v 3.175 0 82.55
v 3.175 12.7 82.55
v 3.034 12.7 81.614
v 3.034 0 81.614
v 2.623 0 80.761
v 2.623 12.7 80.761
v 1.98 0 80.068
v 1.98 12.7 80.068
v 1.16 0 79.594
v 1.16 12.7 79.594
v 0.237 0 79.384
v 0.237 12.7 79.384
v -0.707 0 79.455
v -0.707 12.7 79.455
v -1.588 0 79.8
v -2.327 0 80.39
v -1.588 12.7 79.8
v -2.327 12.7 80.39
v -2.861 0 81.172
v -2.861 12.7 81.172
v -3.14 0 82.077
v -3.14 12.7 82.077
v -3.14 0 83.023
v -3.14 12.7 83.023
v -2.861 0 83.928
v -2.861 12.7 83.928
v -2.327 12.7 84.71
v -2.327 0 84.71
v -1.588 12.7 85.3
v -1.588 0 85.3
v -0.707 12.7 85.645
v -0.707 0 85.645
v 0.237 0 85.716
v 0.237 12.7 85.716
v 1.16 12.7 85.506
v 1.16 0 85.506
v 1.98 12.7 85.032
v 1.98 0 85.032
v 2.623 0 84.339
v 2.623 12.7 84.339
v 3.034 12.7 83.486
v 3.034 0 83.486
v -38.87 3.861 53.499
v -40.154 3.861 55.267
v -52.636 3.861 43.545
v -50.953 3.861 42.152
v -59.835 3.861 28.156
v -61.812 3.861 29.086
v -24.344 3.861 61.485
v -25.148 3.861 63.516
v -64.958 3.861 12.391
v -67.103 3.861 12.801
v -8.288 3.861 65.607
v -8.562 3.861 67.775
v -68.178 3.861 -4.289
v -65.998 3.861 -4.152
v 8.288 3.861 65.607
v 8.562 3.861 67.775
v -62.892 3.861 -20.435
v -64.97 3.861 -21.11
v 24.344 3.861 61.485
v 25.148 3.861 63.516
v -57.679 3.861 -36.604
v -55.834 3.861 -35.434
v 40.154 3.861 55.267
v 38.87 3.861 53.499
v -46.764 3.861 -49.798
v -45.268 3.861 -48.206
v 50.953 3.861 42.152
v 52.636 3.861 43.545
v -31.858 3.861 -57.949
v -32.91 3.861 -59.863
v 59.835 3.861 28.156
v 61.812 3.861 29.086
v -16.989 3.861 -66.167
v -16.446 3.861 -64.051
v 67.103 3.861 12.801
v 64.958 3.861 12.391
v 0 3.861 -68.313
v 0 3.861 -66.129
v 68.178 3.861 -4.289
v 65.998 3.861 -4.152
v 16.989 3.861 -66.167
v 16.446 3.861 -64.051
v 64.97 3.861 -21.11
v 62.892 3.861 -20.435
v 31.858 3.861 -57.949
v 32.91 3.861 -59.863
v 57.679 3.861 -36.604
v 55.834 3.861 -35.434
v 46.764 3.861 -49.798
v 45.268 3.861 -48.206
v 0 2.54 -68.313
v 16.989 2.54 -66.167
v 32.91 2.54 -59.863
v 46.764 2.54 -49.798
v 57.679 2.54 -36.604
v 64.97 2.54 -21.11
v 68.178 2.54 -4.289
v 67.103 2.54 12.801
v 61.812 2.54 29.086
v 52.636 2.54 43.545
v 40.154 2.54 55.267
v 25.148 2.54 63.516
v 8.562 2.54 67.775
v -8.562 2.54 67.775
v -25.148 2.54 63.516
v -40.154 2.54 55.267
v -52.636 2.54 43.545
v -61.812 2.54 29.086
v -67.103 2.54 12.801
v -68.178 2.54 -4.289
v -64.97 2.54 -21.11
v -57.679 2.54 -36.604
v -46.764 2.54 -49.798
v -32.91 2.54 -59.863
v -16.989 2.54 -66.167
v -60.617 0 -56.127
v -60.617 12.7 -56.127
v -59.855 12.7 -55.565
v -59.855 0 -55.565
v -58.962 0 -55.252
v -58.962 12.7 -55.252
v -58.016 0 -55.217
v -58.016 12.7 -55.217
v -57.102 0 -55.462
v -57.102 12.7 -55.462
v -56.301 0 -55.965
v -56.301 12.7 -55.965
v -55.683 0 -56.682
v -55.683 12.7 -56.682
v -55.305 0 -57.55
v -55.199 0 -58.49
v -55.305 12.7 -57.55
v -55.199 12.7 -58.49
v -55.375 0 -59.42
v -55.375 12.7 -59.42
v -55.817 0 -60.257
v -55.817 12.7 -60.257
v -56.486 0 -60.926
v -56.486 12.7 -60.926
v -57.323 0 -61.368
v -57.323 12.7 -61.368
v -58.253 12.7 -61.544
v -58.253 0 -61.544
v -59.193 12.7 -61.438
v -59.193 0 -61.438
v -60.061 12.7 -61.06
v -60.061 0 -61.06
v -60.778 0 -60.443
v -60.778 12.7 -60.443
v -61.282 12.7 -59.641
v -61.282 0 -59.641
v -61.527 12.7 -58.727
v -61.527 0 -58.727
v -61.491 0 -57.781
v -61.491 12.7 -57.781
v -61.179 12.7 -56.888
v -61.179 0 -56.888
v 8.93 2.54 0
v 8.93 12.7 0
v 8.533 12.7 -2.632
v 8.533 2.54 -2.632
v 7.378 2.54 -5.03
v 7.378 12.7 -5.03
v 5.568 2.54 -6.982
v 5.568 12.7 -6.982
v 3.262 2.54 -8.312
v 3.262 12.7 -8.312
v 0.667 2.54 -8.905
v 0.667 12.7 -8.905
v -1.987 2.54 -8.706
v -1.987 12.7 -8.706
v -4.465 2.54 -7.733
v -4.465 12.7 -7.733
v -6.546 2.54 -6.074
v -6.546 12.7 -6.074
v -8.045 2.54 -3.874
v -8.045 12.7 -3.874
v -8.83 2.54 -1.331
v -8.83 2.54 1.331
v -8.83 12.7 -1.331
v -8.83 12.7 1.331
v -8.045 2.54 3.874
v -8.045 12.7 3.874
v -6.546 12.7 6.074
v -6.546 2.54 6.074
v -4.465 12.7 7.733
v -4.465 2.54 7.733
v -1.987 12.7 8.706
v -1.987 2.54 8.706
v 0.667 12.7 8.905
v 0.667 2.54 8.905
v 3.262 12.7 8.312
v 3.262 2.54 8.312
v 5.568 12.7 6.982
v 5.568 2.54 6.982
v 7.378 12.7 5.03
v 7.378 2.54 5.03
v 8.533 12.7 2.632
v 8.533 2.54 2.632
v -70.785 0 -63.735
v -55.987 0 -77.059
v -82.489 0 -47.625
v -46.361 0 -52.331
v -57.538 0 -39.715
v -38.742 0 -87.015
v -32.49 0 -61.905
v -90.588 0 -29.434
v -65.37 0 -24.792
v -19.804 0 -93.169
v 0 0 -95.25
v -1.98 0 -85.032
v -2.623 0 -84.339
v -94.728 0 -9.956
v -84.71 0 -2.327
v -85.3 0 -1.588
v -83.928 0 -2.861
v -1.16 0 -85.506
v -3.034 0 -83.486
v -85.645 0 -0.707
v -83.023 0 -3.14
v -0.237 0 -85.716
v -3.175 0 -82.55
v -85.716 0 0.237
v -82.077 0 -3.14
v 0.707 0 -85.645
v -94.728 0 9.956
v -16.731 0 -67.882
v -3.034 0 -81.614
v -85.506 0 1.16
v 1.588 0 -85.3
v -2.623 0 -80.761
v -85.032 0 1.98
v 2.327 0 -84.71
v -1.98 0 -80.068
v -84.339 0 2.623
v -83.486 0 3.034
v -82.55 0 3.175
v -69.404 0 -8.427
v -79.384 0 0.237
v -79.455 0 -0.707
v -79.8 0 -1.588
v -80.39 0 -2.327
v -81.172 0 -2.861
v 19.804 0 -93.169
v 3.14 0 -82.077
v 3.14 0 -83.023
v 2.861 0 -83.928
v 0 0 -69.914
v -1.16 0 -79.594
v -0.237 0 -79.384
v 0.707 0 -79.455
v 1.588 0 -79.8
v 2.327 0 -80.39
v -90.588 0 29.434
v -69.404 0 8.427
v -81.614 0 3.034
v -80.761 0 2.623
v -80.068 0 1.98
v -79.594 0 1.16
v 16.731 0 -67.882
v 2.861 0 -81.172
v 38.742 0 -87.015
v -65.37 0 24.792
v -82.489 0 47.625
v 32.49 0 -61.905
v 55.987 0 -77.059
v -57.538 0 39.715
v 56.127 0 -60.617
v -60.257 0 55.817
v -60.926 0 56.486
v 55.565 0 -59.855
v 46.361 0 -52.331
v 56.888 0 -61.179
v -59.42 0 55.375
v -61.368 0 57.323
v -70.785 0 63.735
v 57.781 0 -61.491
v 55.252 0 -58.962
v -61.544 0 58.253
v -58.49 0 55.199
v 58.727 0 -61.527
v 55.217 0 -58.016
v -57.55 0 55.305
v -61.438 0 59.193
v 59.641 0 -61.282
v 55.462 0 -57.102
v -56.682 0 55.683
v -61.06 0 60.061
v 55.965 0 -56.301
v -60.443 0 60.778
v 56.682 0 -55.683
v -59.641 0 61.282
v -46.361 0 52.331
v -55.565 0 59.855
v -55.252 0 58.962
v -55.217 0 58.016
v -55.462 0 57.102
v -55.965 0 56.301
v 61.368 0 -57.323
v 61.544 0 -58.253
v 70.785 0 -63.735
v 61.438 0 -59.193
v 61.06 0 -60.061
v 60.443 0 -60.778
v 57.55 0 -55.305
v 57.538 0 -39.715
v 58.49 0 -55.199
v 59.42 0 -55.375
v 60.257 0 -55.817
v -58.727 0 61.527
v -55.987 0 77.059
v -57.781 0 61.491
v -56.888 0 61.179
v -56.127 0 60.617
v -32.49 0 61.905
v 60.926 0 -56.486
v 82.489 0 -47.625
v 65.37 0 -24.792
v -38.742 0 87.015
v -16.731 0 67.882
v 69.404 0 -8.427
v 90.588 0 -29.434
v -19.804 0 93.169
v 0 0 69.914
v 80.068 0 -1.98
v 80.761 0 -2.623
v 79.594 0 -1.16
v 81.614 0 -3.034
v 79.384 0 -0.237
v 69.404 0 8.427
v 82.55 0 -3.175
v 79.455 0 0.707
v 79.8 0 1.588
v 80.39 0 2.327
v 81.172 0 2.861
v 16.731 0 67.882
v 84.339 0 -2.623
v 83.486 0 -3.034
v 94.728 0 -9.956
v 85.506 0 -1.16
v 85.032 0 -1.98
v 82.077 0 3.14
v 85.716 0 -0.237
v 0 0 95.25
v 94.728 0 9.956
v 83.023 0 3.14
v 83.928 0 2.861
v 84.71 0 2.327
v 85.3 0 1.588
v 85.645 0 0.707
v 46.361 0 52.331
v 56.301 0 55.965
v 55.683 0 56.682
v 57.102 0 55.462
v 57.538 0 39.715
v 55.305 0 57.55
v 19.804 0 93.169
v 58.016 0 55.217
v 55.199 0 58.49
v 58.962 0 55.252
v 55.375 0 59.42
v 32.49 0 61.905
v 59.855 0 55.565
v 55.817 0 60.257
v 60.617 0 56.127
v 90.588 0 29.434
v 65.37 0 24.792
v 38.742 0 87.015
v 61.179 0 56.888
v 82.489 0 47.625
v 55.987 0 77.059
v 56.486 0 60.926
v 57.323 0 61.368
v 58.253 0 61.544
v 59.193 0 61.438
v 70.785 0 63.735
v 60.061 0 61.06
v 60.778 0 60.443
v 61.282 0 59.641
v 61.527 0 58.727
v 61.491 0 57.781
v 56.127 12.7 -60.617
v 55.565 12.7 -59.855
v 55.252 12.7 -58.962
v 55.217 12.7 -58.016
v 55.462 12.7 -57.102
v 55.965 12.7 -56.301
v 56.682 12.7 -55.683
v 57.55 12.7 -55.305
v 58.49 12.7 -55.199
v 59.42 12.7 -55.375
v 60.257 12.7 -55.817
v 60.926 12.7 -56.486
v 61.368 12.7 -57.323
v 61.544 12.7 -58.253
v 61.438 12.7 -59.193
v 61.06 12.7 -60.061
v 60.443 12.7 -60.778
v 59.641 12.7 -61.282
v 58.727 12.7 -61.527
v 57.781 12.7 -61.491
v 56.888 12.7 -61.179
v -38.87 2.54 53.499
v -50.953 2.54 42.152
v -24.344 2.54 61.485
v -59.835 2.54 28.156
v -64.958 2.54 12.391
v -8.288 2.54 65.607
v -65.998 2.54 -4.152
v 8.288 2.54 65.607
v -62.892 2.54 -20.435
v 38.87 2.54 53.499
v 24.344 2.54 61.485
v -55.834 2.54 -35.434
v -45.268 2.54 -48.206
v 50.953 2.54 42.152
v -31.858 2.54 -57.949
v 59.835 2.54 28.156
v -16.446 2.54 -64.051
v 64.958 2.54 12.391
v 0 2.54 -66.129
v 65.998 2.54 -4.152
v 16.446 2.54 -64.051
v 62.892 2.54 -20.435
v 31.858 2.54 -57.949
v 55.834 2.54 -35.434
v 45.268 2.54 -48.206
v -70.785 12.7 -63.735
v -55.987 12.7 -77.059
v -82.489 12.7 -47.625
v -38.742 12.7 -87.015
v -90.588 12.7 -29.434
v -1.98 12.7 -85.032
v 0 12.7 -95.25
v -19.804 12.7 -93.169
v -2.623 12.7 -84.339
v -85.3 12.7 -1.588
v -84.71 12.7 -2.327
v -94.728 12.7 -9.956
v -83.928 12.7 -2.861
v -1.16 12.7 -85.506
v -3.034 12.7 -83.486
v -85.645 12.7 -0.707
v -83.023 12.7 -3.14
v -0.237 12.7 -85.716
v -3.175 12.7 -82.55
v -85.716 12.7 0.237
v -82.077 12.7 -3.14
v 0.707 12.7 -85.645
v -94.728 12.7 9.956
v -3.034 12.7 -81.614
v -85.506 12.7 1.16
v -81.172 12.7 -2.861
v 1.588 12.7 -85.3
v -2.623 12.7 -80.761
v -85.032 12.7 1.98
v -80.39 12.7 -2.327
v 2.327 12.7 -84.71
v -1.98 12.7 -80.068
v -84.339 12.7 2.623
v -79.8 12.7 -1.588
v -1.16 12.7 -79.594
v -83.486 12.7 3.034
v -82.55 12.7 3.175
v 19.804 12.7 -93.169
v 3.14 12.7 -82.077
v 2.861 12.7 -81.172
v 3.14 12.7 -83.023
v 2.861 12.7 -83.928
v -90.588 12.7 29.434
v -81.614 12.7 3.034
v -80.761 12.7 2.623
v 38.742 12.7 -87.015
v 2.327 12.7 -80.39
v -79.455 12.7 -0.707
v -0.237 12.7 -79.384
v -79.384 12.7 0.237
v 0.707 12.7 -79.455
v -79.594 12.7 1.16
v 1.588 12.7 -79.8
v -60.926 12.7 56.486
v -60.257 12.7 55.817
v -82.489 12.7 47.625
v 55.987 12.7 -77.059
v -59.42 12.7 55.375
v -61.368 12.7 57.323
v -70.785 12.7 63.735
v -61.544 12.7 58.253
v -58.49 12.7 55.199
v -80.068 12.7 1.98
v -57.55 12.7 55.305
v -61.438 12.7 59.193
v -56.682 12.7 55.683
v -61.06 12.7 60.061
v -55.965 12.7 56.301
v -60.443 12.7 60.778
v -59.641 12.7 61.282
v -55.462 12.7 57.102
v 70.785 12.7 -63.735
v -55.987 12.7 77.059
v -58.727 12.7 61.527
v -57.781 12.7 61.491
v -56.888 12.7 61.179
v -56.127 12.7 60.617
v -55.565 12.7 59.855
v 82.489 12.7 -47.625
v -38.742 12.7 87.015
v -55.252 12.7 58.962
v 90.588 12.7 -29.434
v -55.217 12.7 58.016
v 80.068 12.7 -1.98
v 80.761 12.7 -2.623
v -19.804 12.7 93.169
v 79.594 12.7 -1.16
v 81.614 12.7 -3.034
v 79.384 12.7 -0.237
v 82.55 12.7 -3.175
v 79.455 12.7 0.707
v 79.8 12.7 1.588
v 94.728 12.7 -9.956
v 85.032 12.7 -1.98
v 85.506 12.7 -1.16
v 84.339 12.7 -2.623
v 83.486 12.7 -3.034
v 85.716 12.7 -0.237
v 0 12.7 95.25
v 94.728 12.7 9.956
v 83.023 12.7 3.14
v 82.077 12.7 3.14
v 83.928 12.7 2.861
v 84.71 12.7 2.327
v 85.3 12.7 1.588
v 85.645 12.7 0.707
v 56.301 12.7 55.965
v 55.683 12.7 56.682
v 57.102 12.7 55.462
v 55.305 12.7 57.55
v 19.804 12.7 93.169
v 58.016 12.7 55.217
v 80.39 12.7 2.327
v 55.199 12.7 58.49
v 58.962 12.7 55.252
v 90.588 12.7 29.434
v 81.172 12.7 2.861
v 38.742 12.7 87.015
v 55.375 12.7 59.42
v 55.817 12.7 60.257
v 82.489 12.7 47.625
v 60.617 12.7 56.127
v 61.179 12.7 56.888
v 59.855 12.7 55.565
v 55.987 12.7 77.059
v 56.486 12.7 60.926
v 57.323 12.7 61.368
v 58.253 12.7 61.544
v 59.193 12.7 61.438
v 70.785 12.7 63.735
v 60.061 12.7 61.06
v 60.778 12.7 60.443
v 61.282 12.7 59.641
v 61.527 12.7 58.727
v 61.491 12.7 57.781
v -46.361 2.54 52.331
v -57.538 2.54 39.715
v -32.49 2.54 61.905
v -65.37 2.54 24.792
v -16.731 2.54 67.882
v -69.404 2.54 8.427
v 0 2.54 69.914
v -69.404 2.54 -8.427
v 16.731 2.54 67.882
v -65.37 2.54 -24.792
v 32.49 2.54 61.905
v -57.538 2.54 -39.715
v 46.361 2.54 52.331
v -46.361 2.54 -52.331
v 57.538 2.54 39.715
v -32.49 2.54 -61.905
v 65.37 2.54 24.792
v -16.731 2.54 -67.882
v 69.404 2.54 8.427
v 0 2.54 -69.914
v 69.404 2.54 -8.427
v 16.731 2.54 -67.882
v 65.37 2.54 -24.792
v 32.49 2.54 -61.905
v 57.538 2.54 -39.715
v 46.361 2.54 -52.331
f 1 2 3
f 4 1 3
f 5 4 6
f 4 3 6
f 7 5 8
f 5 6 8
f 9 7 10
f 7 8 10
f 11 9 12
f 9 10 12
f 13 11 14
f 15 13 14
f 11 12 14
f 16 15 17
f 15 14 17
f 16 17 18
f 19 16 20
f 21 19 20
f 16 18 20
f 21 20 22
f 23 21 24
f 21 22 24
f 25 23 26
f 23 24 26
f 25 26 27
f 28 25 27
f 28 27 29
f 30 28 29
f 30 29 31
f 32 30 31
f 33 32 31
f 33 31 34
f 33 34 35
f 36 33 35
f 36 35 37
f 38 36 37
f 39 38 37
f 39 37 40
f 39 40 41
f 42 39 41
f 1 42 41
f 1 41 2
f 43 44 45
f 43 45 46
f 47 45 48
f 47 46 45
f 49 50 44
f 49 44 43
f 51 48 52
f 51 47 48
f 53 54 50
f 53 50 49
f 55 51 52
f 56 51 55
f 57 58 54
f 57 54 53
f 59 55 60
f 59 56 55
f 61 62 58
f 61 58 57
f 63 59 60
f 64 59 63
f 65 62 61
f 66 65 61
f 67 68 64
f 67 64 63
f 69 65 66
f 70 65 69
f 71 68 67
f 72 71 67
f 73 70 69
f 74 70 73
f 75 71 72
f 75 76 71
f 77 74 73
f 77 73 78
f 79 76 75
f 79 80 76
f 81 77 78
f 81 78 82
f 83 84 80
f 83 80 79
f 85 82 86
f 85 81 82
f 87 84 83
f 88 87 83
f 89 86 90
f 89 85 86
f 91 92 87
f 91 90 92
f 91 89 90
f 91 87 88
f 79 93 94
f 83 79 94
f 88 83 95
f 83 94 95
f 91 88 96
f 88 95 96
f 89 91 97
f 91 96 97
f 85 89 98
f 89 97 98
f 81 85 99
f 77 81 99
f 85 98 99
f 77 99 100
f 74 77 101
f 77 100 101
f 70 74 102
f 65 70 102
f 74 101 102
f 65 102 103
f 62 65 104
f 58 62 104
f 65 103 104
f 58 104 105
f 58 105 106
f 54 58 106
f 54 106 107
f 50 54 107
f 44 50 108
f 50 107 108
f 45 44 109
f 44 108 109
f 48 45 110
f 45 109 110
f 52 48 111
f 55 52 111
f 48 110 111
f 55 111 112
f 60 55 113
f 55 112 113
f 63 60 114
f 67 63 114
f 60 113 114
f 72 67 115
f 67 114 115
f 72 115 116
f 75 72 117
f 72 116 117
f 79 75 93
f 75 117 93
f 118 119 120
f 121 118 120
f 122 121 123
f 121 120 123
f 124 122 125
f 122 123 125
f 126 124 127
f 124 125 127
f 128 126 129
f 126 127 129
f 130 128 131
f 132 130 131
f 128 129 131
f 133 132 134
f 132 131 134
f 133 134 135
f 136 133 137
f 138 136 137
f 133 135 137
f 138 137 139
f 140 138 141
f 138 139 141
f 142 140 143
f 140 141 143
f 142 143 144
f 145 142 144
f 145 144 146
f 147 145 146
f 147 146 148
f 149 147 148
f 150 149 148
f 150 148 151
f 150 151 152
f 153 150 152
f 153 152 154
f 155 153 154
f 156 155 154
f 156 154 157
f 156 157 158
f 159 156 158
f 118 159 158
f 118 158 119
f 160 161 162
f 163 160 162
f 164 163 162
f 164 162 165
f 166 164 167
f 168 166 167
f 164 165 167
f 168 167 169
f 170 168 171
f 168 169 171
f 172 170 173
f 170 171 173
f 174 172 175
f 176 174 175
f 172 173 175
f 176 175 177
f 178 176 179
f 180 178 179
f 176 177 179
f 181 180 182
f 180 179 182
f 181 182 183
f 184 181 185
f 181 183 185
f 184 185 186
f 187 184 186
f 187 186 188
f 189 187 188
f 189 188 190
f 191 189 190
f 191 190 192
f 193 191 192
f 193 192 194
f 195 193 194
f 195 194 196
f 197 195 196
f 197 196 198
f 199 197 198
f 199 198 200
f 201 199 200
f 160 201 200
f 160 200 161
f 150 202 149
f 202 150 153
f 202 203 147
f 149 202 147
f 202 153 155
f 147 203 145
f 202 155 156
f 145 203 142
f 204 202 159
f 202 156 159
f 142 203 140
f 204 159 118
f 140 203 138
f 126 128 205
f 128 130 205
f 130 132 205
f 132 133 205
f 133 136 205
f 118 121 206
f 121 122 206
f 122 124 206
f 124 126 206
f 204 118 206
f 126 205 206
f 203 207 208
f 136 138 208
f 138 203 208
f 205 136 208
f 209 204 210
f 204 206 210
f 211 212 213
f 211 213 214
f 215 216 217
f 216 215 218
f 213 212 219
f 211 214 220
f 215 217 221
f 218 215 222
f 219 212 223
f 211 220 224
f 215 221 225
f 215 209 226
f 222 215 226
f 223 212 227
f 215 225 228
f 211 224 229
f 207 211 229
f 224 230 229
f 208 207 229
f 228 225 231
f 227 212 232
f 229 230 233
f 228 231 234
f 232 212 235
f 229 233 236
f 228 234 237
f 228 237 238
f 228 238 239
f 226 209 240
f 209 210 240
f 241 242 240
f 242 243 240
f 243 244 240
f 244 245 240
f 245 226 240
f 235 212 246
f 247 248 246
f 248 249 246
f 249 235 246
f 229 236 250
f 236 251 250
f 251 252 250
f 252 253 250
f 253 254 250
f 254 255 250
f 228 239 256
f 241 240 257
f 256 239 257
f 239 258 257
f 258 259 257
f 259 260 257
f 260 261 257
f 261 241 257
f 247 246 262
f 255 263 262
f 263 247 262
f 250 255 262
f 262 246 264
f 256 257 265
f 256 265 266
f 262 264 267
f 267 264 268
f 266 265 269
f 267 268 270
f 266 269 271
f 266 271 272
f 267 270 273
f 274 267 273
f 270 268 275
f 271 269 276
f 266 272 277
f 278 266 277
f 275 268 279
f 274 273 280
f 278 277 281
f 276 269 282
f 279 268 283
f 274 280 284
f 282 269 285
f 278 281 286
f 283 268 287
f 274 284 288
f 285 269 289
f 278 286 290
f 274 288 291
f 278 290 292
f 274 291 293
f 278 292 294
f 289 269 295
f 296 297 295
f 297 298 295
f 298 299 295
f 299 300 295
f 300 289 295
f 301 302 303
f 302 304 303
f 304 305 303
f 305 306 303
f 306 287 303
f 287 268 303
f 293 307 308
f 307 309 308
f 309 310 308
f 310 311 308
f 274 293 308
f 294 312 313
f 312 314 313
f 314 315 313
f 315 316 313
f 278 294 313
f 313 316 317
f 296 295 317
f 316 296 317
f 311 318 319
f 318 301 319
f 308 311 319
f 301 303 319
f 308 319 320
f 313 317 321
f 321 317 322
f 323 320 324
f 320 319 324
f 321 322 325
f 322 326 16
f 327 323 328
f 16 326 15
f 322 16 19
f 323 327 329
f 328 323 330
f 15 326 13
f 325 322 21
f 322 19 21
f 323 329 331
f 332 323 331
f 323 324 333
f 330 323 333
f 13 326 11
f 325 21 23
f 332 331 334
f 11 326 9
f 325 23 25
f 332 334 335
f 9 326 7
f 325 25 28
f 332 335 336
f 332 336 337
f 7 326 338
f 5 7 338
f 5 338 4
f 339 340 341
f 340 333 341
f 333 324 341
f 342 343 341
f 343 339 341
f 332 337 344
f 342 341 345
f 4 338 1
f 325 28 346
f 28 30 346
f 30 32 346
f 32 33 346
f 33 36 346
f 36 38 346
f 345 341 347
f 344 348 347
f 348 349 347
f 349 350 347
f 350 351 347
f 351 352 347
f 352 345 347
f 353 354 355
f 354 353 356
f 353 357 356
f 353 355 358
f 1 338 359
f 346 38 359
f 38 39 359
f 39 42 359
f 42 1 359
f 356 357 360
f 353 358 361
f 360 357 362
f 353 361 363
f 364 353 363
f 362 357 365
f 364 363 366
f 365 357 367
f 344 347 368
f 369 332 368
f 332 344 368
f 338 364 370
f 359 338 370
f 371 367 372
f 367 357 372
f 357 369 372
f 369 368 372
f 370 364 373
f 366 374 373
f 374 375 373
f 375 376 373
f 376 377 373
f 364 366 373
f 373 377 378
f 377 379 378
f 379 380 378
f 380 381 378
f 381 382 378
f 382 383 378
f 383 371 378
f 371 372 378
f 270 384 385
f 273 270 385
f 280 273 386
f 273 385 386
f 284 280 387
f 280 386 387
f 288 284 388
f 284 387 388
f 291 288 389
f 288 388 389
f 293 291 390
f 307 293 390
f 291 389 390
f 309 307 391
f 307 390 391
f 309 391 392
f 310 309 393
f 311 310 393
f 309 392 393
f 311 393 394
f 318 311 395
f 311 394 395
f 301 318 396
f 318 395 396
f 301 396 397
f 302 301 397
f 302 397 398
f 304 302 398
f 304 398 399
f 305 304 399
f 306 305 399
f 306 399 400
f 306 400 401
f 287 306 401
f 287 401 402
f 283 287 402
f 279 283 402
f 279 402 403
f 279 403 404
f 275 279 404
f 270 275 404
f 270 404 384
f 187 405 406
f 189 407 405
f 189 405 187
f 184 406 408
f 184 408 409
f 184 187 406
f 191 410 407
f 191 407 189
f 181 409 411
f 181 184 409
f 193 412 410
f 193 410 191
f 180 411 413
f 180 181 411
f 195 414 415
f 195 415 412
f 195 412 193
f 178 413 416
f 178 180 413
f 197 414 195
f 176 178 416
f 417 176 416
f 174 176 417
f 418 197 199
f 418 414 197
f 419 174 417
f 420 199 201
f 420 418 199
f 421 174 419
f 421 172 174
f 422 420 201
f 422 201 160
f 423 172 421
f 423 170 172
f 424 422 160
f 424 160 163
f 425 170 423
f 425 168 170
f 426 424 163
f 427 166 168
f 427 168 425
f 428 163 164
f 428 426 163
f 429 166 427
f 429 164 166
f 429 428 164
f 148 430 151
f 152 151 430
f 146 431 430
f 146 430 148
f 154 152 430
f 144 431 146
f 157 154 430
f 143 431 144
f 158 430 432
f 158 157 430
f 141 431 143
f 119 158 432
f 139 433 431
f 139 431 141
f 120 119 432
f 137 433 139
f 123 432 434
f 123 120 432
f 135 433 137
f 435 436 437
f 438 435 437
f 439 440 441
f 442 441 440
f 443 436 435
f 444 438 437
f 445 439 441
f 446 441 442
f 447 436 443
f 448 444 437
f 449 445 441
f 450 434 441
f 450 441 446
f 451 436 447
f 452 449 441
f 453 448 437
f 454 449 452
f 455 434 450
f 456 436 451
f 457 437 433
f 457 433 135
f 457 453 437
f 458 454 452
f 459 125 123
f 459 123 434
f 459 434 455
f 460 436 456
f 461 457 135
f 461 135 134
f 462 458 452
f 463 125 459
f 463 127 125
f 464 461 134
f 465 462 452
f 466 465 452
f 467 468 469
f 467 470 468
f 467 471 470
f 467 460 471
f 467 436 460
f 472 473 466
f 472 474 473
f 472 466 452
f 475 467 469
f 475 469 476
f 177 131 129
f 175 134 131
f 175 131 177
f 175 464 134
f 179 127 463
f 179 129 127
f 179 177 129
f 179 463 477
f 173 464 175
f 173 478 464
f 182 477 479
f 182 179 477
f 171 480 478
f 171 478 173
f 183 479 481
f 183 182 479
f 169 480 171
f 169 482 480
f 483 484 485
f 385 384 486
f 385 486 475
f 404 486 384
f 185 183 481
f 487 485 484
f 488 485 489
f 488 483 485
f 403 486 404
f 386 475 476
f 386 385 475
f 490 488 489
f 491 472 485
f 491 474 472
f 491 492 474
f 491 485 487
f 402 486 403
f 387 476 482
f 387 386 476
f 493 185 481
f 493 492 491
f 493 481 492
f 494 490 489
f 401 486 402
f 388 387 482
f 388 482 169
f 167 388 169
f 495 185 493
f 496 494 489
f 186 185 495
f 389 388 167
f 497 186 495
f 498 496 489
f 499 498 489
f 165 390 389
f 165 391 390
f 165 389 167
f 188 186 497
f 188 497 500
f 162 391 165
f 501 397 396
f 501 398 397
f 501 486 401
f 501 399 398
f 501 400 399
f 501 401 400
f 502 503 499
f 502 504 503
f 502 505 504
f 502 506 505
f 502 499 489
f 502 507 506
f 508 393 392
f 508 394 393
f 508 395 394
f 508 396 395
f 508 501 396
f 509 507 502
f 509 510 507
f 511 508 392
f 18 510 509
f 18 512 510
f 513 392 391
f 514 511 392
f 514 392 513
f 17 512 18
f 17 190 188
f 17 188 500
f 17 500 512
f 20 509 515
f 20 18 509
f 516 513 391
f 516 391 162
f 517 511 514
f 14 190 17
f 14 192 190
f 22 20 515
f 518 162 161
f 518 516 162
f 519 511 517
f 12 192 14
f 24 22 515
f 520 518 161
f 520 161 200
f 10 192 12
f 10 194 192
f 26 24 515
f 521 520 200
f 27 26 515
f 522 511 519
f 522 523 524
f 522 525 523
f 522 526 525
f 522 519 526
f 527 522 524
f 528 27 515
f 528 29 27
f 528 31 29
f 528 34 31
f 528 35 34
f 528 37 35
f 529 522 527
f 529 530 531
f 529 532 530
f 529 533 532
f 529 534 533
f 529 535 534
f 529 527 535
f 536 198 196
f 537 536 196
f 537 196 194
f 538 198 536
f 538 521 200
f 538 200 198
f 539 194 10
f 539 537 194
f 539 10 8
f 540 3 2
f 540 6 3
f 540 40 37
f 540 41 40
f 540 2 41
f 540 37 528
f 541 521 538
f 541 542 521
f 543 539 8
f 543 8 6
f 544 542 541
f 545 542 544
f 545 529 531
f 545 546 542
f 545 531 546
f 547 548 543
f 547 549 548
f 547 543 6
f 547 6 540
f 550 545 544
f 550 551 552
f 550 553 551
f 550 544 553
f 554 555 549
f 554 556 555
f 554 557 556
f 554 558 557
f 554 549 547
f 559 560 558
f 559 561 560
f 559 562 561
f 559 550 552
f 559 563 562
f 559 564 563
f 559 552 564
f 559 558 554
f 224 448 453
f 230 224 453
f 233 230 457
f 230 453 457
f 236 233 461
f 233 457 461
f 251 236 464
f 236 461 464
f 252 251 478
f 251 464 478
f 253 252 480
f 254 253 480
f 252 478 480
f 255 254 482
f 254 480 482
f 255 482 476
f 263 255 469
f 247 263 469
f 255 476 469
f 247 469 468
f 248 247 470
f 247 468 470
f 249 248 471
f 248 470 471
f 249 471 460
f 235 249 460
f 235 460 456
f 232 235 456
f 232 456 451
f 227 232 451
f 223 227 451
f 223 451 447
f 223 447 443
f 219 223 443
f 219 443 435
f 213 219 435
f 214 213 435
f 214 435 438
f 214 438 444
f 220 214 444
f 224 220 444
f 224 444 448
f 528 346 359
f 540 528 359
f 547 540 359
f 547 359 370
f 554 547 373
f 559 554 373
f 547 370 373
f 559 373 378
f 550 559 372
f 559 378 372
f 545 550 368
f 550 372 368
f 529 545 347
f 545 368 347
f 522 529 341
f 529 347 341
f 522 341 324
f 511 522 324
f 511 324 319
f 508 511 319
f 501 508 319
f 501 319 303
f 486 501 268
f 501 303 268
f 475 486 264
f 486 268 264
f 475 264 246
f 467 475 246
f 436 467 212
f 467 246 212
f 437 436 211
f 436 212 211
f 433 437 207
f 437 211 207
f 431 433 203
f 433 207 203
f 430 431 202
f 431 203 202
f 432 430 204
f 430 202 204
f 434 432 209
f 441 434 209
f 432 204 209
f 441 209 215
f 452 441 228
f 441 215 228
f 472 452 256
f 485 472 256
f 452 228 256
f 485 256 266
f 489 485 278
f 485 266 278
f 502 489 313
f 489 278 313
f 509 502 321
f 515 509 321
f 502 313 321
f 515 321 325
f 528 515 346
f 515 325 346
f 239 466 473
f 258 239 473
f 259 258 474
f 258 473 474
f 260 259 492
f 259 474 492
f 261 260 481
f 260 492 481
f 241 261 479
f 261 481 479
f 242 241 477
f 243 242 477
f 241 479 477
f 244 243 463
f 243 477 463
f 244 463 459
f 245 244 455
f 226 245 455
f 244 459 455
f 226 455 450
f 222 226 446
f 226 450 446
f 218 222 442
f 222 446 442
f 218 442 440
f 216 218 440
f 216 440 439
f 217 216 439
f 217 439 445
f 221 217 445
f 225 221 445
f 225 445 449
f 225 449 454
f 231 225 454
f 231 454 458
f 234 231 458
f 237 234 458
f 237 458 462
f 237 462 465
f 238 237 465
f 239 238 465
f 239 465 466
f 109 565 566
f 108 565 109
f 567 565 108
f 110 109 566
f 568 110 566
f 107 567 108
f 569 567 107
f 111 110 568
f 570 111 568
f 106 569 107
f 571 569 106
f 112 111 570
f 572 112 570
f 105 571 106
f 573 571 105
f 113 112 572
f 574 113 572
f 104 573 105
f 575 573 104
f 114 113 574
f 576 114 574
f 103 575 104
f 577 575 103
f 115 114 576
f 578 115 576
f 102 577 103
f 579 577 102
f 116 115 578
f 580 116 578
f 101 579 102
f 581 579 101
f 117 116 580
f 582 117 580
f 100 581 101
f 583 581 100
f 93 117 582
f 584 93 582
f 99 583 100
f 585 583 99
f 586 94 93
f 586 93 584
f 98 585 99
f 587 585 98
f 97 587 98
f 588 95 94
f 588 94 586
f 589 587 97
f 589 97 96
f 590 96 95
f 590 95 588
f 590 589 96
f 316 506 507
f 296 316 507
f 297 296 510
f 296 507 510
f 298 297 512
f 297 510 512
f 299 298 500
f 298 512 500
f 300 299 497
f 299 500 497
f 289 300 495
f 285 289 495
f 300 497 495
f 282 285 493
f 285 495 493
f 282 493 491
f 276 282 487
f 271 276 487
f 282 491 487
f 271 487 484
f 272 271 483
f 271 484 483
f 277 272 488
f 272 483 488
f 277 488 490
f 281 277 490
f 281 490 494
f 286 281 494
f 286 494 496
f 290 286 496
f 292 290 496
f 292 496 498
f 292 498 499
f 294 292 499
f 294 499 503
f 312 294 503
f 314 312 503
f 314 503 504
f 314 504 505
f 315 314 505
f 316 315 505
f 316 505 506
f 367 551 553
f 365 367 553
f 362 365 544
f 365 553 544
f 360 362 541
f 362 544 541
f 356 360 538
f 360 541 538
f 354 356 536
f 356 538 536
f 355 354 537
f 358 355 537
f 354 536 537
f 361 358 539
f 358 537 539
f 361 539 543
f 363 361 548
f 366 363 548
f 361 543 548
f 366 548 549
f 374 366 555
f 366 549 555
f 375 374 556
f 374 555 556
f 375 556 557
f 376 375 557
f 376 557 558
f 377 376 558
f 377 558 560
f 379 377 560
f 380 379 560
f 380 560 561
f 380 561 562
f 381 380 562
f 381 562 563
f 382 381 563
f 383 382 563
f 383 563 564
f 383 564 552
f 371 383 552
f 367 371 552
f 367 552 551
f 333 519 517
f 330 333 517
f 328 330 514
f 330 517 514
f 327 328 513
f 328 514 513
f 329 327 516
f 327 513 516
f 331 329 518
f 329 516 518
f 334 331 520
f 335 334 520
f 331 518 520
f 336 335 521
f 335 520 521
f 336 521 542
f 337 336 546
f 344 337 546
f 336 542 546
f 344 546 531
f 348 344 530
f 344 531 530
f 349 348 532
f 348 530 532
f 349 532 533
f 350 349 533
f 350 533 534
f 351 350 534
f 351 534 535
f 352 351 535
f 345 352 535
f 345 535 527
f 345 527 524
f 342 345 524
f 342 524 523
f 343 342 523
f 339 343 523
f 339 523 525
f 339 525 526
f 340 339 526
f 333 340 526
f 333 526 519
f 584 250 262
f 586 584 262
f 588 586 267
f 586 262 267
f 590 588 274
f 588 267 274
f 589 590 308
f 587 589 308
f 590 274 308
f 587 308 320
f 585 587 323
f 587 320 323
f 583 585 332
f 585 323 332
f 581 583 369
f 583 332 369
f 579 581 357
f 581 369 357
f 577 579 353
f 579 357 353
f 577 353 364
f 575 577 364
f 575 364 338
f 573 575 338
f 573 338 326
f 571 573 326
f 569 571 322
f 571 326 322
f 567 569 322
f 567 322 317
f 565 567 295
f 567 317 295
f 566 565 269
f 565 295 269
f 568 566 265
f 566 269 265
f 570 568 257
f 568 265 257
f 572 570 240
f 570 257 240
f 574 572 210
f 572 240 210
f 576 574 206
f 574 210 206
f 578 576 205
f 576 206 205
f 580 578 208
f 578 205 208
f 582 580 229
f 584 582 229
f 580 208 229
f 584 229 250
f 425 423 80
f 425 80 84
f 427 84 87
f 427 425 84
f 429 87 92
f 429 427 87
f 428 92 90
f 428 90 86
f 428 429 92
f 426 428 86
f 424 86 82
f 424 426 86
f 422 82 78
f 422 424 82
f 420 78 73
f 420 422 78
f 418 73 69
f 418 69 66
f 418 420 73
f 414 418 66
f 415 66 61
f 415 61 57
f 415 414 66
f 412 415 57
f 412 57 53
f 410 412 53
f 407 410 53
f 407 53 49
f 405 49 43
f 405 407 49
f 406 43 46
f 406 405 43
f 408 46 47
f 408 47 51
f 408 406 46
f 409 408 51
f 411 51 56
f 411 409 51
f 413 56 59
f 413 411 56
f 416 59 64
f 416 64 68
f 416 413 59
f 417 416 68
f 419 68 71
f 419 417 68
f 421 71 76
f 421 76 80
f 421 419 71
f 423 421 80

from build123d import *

# Parameters (mm, degrees)
SKETCH1_R                        = 95.25
BOSS_EXTRUDE1_DEPTH              = 12.7
F_1_4_0_25_DIAMETER_HOLE1_D      = 6.35
CIRPATTERN1_COUNT                = 8
SKETCH7_R                        = 69.9135
CUT_EXTRUDE3_DEPTH               = 2.54
SKETCH2_R                        = 68.3133
SKETCH2_R_2                      = 66.1289
CUT_EXTRUDE1_DEPTH               = 1.3208
F_45_64_0_70313_DIAMETER_HOLE1_D = 17.859502


with BuildPart() as part:
    # Sketch1 → Boss-Extrude1 (new body)
    with BuildSketch(Plane(origin=(0, 0, 0), x_dir=(1, 0, 0), z_dir=(0, 1, 0))):
        with Locations(Location((0, 0, 0), (0, 0, 270))):
            Circle(SKETCH1_R)
    extrude(amount=BOSS_EXTRUDE1_DEPTH)

    # 1/4 (0.25) Diameter Hole1 (through all)
    with Locations(Plane(origin=(0, 0, 0), x_dir=(-1, 0, 0), z_dir=(0, -1, 0))):
        with Locations((0, -82.55)):
            f_1_4_0_25_diameter_hole1 = Hole(F_1_4_0_25_DIAMETER_HOLE1_D / 2)

    # CirPattern1: 1/4 (0.25) Diameter Hole1 ×8 about axis
    cirpattern1_axis = Axis((0, 0, 0), (0, 1, 0))
    for i in range(1, CIRPATTERN1_COUNT):
        add(f_1_4_0_25_diameter_hole1.rotate(cirpattern1_axis, i * 360 / CIRPATTERN1_COUNT), mode=Mode.SUBTRACT)

    # Sketch7 → Cut-Extrude3 (cut)
    with BuildSketch(Plane(origin=(0, 0, 0), x_dir=(-1, 0, 0), z_dir=(0, -1, 0))):
        with Locations(Location((0, 0, 0), (0, 0, 90))):
            Circle(SKETCH7_R)
    extrude(amount=-CUT_EXTRUDE3_DEPTH, mode=Mode.SUBTRACT)

    # Sketch2 → Cut-Extrude1 (cut)
    with BuildSketch(Plane.XZ.offset(-2.54)):
        with Locations(Location((0, 0, 0), (0, 0, 270))):
            Circle(SKETCH2_R)
        with Locations(Location((0, 0, 0), (0, 0, 270))):
            Circle(SKETCH2_R_2, mode=Mode.SUBTRACT)
    extrude(amount=-CUT_EXTRUDE1_DEPTH, mode=Mode.SUBTRACT)

    # 45/64 (0.70313) Diameter Hole1 (through all)
    with Locations(Plane(origin=(0, 2.54, 0), x_dir=(-1, 0, 0), z_dir=(0, -1, 0))):
        with Locations((0, 0)):
            Hole(F_45_64_0_70313_DIAMETER_HOLE1_D / 2)


solid = part.part
